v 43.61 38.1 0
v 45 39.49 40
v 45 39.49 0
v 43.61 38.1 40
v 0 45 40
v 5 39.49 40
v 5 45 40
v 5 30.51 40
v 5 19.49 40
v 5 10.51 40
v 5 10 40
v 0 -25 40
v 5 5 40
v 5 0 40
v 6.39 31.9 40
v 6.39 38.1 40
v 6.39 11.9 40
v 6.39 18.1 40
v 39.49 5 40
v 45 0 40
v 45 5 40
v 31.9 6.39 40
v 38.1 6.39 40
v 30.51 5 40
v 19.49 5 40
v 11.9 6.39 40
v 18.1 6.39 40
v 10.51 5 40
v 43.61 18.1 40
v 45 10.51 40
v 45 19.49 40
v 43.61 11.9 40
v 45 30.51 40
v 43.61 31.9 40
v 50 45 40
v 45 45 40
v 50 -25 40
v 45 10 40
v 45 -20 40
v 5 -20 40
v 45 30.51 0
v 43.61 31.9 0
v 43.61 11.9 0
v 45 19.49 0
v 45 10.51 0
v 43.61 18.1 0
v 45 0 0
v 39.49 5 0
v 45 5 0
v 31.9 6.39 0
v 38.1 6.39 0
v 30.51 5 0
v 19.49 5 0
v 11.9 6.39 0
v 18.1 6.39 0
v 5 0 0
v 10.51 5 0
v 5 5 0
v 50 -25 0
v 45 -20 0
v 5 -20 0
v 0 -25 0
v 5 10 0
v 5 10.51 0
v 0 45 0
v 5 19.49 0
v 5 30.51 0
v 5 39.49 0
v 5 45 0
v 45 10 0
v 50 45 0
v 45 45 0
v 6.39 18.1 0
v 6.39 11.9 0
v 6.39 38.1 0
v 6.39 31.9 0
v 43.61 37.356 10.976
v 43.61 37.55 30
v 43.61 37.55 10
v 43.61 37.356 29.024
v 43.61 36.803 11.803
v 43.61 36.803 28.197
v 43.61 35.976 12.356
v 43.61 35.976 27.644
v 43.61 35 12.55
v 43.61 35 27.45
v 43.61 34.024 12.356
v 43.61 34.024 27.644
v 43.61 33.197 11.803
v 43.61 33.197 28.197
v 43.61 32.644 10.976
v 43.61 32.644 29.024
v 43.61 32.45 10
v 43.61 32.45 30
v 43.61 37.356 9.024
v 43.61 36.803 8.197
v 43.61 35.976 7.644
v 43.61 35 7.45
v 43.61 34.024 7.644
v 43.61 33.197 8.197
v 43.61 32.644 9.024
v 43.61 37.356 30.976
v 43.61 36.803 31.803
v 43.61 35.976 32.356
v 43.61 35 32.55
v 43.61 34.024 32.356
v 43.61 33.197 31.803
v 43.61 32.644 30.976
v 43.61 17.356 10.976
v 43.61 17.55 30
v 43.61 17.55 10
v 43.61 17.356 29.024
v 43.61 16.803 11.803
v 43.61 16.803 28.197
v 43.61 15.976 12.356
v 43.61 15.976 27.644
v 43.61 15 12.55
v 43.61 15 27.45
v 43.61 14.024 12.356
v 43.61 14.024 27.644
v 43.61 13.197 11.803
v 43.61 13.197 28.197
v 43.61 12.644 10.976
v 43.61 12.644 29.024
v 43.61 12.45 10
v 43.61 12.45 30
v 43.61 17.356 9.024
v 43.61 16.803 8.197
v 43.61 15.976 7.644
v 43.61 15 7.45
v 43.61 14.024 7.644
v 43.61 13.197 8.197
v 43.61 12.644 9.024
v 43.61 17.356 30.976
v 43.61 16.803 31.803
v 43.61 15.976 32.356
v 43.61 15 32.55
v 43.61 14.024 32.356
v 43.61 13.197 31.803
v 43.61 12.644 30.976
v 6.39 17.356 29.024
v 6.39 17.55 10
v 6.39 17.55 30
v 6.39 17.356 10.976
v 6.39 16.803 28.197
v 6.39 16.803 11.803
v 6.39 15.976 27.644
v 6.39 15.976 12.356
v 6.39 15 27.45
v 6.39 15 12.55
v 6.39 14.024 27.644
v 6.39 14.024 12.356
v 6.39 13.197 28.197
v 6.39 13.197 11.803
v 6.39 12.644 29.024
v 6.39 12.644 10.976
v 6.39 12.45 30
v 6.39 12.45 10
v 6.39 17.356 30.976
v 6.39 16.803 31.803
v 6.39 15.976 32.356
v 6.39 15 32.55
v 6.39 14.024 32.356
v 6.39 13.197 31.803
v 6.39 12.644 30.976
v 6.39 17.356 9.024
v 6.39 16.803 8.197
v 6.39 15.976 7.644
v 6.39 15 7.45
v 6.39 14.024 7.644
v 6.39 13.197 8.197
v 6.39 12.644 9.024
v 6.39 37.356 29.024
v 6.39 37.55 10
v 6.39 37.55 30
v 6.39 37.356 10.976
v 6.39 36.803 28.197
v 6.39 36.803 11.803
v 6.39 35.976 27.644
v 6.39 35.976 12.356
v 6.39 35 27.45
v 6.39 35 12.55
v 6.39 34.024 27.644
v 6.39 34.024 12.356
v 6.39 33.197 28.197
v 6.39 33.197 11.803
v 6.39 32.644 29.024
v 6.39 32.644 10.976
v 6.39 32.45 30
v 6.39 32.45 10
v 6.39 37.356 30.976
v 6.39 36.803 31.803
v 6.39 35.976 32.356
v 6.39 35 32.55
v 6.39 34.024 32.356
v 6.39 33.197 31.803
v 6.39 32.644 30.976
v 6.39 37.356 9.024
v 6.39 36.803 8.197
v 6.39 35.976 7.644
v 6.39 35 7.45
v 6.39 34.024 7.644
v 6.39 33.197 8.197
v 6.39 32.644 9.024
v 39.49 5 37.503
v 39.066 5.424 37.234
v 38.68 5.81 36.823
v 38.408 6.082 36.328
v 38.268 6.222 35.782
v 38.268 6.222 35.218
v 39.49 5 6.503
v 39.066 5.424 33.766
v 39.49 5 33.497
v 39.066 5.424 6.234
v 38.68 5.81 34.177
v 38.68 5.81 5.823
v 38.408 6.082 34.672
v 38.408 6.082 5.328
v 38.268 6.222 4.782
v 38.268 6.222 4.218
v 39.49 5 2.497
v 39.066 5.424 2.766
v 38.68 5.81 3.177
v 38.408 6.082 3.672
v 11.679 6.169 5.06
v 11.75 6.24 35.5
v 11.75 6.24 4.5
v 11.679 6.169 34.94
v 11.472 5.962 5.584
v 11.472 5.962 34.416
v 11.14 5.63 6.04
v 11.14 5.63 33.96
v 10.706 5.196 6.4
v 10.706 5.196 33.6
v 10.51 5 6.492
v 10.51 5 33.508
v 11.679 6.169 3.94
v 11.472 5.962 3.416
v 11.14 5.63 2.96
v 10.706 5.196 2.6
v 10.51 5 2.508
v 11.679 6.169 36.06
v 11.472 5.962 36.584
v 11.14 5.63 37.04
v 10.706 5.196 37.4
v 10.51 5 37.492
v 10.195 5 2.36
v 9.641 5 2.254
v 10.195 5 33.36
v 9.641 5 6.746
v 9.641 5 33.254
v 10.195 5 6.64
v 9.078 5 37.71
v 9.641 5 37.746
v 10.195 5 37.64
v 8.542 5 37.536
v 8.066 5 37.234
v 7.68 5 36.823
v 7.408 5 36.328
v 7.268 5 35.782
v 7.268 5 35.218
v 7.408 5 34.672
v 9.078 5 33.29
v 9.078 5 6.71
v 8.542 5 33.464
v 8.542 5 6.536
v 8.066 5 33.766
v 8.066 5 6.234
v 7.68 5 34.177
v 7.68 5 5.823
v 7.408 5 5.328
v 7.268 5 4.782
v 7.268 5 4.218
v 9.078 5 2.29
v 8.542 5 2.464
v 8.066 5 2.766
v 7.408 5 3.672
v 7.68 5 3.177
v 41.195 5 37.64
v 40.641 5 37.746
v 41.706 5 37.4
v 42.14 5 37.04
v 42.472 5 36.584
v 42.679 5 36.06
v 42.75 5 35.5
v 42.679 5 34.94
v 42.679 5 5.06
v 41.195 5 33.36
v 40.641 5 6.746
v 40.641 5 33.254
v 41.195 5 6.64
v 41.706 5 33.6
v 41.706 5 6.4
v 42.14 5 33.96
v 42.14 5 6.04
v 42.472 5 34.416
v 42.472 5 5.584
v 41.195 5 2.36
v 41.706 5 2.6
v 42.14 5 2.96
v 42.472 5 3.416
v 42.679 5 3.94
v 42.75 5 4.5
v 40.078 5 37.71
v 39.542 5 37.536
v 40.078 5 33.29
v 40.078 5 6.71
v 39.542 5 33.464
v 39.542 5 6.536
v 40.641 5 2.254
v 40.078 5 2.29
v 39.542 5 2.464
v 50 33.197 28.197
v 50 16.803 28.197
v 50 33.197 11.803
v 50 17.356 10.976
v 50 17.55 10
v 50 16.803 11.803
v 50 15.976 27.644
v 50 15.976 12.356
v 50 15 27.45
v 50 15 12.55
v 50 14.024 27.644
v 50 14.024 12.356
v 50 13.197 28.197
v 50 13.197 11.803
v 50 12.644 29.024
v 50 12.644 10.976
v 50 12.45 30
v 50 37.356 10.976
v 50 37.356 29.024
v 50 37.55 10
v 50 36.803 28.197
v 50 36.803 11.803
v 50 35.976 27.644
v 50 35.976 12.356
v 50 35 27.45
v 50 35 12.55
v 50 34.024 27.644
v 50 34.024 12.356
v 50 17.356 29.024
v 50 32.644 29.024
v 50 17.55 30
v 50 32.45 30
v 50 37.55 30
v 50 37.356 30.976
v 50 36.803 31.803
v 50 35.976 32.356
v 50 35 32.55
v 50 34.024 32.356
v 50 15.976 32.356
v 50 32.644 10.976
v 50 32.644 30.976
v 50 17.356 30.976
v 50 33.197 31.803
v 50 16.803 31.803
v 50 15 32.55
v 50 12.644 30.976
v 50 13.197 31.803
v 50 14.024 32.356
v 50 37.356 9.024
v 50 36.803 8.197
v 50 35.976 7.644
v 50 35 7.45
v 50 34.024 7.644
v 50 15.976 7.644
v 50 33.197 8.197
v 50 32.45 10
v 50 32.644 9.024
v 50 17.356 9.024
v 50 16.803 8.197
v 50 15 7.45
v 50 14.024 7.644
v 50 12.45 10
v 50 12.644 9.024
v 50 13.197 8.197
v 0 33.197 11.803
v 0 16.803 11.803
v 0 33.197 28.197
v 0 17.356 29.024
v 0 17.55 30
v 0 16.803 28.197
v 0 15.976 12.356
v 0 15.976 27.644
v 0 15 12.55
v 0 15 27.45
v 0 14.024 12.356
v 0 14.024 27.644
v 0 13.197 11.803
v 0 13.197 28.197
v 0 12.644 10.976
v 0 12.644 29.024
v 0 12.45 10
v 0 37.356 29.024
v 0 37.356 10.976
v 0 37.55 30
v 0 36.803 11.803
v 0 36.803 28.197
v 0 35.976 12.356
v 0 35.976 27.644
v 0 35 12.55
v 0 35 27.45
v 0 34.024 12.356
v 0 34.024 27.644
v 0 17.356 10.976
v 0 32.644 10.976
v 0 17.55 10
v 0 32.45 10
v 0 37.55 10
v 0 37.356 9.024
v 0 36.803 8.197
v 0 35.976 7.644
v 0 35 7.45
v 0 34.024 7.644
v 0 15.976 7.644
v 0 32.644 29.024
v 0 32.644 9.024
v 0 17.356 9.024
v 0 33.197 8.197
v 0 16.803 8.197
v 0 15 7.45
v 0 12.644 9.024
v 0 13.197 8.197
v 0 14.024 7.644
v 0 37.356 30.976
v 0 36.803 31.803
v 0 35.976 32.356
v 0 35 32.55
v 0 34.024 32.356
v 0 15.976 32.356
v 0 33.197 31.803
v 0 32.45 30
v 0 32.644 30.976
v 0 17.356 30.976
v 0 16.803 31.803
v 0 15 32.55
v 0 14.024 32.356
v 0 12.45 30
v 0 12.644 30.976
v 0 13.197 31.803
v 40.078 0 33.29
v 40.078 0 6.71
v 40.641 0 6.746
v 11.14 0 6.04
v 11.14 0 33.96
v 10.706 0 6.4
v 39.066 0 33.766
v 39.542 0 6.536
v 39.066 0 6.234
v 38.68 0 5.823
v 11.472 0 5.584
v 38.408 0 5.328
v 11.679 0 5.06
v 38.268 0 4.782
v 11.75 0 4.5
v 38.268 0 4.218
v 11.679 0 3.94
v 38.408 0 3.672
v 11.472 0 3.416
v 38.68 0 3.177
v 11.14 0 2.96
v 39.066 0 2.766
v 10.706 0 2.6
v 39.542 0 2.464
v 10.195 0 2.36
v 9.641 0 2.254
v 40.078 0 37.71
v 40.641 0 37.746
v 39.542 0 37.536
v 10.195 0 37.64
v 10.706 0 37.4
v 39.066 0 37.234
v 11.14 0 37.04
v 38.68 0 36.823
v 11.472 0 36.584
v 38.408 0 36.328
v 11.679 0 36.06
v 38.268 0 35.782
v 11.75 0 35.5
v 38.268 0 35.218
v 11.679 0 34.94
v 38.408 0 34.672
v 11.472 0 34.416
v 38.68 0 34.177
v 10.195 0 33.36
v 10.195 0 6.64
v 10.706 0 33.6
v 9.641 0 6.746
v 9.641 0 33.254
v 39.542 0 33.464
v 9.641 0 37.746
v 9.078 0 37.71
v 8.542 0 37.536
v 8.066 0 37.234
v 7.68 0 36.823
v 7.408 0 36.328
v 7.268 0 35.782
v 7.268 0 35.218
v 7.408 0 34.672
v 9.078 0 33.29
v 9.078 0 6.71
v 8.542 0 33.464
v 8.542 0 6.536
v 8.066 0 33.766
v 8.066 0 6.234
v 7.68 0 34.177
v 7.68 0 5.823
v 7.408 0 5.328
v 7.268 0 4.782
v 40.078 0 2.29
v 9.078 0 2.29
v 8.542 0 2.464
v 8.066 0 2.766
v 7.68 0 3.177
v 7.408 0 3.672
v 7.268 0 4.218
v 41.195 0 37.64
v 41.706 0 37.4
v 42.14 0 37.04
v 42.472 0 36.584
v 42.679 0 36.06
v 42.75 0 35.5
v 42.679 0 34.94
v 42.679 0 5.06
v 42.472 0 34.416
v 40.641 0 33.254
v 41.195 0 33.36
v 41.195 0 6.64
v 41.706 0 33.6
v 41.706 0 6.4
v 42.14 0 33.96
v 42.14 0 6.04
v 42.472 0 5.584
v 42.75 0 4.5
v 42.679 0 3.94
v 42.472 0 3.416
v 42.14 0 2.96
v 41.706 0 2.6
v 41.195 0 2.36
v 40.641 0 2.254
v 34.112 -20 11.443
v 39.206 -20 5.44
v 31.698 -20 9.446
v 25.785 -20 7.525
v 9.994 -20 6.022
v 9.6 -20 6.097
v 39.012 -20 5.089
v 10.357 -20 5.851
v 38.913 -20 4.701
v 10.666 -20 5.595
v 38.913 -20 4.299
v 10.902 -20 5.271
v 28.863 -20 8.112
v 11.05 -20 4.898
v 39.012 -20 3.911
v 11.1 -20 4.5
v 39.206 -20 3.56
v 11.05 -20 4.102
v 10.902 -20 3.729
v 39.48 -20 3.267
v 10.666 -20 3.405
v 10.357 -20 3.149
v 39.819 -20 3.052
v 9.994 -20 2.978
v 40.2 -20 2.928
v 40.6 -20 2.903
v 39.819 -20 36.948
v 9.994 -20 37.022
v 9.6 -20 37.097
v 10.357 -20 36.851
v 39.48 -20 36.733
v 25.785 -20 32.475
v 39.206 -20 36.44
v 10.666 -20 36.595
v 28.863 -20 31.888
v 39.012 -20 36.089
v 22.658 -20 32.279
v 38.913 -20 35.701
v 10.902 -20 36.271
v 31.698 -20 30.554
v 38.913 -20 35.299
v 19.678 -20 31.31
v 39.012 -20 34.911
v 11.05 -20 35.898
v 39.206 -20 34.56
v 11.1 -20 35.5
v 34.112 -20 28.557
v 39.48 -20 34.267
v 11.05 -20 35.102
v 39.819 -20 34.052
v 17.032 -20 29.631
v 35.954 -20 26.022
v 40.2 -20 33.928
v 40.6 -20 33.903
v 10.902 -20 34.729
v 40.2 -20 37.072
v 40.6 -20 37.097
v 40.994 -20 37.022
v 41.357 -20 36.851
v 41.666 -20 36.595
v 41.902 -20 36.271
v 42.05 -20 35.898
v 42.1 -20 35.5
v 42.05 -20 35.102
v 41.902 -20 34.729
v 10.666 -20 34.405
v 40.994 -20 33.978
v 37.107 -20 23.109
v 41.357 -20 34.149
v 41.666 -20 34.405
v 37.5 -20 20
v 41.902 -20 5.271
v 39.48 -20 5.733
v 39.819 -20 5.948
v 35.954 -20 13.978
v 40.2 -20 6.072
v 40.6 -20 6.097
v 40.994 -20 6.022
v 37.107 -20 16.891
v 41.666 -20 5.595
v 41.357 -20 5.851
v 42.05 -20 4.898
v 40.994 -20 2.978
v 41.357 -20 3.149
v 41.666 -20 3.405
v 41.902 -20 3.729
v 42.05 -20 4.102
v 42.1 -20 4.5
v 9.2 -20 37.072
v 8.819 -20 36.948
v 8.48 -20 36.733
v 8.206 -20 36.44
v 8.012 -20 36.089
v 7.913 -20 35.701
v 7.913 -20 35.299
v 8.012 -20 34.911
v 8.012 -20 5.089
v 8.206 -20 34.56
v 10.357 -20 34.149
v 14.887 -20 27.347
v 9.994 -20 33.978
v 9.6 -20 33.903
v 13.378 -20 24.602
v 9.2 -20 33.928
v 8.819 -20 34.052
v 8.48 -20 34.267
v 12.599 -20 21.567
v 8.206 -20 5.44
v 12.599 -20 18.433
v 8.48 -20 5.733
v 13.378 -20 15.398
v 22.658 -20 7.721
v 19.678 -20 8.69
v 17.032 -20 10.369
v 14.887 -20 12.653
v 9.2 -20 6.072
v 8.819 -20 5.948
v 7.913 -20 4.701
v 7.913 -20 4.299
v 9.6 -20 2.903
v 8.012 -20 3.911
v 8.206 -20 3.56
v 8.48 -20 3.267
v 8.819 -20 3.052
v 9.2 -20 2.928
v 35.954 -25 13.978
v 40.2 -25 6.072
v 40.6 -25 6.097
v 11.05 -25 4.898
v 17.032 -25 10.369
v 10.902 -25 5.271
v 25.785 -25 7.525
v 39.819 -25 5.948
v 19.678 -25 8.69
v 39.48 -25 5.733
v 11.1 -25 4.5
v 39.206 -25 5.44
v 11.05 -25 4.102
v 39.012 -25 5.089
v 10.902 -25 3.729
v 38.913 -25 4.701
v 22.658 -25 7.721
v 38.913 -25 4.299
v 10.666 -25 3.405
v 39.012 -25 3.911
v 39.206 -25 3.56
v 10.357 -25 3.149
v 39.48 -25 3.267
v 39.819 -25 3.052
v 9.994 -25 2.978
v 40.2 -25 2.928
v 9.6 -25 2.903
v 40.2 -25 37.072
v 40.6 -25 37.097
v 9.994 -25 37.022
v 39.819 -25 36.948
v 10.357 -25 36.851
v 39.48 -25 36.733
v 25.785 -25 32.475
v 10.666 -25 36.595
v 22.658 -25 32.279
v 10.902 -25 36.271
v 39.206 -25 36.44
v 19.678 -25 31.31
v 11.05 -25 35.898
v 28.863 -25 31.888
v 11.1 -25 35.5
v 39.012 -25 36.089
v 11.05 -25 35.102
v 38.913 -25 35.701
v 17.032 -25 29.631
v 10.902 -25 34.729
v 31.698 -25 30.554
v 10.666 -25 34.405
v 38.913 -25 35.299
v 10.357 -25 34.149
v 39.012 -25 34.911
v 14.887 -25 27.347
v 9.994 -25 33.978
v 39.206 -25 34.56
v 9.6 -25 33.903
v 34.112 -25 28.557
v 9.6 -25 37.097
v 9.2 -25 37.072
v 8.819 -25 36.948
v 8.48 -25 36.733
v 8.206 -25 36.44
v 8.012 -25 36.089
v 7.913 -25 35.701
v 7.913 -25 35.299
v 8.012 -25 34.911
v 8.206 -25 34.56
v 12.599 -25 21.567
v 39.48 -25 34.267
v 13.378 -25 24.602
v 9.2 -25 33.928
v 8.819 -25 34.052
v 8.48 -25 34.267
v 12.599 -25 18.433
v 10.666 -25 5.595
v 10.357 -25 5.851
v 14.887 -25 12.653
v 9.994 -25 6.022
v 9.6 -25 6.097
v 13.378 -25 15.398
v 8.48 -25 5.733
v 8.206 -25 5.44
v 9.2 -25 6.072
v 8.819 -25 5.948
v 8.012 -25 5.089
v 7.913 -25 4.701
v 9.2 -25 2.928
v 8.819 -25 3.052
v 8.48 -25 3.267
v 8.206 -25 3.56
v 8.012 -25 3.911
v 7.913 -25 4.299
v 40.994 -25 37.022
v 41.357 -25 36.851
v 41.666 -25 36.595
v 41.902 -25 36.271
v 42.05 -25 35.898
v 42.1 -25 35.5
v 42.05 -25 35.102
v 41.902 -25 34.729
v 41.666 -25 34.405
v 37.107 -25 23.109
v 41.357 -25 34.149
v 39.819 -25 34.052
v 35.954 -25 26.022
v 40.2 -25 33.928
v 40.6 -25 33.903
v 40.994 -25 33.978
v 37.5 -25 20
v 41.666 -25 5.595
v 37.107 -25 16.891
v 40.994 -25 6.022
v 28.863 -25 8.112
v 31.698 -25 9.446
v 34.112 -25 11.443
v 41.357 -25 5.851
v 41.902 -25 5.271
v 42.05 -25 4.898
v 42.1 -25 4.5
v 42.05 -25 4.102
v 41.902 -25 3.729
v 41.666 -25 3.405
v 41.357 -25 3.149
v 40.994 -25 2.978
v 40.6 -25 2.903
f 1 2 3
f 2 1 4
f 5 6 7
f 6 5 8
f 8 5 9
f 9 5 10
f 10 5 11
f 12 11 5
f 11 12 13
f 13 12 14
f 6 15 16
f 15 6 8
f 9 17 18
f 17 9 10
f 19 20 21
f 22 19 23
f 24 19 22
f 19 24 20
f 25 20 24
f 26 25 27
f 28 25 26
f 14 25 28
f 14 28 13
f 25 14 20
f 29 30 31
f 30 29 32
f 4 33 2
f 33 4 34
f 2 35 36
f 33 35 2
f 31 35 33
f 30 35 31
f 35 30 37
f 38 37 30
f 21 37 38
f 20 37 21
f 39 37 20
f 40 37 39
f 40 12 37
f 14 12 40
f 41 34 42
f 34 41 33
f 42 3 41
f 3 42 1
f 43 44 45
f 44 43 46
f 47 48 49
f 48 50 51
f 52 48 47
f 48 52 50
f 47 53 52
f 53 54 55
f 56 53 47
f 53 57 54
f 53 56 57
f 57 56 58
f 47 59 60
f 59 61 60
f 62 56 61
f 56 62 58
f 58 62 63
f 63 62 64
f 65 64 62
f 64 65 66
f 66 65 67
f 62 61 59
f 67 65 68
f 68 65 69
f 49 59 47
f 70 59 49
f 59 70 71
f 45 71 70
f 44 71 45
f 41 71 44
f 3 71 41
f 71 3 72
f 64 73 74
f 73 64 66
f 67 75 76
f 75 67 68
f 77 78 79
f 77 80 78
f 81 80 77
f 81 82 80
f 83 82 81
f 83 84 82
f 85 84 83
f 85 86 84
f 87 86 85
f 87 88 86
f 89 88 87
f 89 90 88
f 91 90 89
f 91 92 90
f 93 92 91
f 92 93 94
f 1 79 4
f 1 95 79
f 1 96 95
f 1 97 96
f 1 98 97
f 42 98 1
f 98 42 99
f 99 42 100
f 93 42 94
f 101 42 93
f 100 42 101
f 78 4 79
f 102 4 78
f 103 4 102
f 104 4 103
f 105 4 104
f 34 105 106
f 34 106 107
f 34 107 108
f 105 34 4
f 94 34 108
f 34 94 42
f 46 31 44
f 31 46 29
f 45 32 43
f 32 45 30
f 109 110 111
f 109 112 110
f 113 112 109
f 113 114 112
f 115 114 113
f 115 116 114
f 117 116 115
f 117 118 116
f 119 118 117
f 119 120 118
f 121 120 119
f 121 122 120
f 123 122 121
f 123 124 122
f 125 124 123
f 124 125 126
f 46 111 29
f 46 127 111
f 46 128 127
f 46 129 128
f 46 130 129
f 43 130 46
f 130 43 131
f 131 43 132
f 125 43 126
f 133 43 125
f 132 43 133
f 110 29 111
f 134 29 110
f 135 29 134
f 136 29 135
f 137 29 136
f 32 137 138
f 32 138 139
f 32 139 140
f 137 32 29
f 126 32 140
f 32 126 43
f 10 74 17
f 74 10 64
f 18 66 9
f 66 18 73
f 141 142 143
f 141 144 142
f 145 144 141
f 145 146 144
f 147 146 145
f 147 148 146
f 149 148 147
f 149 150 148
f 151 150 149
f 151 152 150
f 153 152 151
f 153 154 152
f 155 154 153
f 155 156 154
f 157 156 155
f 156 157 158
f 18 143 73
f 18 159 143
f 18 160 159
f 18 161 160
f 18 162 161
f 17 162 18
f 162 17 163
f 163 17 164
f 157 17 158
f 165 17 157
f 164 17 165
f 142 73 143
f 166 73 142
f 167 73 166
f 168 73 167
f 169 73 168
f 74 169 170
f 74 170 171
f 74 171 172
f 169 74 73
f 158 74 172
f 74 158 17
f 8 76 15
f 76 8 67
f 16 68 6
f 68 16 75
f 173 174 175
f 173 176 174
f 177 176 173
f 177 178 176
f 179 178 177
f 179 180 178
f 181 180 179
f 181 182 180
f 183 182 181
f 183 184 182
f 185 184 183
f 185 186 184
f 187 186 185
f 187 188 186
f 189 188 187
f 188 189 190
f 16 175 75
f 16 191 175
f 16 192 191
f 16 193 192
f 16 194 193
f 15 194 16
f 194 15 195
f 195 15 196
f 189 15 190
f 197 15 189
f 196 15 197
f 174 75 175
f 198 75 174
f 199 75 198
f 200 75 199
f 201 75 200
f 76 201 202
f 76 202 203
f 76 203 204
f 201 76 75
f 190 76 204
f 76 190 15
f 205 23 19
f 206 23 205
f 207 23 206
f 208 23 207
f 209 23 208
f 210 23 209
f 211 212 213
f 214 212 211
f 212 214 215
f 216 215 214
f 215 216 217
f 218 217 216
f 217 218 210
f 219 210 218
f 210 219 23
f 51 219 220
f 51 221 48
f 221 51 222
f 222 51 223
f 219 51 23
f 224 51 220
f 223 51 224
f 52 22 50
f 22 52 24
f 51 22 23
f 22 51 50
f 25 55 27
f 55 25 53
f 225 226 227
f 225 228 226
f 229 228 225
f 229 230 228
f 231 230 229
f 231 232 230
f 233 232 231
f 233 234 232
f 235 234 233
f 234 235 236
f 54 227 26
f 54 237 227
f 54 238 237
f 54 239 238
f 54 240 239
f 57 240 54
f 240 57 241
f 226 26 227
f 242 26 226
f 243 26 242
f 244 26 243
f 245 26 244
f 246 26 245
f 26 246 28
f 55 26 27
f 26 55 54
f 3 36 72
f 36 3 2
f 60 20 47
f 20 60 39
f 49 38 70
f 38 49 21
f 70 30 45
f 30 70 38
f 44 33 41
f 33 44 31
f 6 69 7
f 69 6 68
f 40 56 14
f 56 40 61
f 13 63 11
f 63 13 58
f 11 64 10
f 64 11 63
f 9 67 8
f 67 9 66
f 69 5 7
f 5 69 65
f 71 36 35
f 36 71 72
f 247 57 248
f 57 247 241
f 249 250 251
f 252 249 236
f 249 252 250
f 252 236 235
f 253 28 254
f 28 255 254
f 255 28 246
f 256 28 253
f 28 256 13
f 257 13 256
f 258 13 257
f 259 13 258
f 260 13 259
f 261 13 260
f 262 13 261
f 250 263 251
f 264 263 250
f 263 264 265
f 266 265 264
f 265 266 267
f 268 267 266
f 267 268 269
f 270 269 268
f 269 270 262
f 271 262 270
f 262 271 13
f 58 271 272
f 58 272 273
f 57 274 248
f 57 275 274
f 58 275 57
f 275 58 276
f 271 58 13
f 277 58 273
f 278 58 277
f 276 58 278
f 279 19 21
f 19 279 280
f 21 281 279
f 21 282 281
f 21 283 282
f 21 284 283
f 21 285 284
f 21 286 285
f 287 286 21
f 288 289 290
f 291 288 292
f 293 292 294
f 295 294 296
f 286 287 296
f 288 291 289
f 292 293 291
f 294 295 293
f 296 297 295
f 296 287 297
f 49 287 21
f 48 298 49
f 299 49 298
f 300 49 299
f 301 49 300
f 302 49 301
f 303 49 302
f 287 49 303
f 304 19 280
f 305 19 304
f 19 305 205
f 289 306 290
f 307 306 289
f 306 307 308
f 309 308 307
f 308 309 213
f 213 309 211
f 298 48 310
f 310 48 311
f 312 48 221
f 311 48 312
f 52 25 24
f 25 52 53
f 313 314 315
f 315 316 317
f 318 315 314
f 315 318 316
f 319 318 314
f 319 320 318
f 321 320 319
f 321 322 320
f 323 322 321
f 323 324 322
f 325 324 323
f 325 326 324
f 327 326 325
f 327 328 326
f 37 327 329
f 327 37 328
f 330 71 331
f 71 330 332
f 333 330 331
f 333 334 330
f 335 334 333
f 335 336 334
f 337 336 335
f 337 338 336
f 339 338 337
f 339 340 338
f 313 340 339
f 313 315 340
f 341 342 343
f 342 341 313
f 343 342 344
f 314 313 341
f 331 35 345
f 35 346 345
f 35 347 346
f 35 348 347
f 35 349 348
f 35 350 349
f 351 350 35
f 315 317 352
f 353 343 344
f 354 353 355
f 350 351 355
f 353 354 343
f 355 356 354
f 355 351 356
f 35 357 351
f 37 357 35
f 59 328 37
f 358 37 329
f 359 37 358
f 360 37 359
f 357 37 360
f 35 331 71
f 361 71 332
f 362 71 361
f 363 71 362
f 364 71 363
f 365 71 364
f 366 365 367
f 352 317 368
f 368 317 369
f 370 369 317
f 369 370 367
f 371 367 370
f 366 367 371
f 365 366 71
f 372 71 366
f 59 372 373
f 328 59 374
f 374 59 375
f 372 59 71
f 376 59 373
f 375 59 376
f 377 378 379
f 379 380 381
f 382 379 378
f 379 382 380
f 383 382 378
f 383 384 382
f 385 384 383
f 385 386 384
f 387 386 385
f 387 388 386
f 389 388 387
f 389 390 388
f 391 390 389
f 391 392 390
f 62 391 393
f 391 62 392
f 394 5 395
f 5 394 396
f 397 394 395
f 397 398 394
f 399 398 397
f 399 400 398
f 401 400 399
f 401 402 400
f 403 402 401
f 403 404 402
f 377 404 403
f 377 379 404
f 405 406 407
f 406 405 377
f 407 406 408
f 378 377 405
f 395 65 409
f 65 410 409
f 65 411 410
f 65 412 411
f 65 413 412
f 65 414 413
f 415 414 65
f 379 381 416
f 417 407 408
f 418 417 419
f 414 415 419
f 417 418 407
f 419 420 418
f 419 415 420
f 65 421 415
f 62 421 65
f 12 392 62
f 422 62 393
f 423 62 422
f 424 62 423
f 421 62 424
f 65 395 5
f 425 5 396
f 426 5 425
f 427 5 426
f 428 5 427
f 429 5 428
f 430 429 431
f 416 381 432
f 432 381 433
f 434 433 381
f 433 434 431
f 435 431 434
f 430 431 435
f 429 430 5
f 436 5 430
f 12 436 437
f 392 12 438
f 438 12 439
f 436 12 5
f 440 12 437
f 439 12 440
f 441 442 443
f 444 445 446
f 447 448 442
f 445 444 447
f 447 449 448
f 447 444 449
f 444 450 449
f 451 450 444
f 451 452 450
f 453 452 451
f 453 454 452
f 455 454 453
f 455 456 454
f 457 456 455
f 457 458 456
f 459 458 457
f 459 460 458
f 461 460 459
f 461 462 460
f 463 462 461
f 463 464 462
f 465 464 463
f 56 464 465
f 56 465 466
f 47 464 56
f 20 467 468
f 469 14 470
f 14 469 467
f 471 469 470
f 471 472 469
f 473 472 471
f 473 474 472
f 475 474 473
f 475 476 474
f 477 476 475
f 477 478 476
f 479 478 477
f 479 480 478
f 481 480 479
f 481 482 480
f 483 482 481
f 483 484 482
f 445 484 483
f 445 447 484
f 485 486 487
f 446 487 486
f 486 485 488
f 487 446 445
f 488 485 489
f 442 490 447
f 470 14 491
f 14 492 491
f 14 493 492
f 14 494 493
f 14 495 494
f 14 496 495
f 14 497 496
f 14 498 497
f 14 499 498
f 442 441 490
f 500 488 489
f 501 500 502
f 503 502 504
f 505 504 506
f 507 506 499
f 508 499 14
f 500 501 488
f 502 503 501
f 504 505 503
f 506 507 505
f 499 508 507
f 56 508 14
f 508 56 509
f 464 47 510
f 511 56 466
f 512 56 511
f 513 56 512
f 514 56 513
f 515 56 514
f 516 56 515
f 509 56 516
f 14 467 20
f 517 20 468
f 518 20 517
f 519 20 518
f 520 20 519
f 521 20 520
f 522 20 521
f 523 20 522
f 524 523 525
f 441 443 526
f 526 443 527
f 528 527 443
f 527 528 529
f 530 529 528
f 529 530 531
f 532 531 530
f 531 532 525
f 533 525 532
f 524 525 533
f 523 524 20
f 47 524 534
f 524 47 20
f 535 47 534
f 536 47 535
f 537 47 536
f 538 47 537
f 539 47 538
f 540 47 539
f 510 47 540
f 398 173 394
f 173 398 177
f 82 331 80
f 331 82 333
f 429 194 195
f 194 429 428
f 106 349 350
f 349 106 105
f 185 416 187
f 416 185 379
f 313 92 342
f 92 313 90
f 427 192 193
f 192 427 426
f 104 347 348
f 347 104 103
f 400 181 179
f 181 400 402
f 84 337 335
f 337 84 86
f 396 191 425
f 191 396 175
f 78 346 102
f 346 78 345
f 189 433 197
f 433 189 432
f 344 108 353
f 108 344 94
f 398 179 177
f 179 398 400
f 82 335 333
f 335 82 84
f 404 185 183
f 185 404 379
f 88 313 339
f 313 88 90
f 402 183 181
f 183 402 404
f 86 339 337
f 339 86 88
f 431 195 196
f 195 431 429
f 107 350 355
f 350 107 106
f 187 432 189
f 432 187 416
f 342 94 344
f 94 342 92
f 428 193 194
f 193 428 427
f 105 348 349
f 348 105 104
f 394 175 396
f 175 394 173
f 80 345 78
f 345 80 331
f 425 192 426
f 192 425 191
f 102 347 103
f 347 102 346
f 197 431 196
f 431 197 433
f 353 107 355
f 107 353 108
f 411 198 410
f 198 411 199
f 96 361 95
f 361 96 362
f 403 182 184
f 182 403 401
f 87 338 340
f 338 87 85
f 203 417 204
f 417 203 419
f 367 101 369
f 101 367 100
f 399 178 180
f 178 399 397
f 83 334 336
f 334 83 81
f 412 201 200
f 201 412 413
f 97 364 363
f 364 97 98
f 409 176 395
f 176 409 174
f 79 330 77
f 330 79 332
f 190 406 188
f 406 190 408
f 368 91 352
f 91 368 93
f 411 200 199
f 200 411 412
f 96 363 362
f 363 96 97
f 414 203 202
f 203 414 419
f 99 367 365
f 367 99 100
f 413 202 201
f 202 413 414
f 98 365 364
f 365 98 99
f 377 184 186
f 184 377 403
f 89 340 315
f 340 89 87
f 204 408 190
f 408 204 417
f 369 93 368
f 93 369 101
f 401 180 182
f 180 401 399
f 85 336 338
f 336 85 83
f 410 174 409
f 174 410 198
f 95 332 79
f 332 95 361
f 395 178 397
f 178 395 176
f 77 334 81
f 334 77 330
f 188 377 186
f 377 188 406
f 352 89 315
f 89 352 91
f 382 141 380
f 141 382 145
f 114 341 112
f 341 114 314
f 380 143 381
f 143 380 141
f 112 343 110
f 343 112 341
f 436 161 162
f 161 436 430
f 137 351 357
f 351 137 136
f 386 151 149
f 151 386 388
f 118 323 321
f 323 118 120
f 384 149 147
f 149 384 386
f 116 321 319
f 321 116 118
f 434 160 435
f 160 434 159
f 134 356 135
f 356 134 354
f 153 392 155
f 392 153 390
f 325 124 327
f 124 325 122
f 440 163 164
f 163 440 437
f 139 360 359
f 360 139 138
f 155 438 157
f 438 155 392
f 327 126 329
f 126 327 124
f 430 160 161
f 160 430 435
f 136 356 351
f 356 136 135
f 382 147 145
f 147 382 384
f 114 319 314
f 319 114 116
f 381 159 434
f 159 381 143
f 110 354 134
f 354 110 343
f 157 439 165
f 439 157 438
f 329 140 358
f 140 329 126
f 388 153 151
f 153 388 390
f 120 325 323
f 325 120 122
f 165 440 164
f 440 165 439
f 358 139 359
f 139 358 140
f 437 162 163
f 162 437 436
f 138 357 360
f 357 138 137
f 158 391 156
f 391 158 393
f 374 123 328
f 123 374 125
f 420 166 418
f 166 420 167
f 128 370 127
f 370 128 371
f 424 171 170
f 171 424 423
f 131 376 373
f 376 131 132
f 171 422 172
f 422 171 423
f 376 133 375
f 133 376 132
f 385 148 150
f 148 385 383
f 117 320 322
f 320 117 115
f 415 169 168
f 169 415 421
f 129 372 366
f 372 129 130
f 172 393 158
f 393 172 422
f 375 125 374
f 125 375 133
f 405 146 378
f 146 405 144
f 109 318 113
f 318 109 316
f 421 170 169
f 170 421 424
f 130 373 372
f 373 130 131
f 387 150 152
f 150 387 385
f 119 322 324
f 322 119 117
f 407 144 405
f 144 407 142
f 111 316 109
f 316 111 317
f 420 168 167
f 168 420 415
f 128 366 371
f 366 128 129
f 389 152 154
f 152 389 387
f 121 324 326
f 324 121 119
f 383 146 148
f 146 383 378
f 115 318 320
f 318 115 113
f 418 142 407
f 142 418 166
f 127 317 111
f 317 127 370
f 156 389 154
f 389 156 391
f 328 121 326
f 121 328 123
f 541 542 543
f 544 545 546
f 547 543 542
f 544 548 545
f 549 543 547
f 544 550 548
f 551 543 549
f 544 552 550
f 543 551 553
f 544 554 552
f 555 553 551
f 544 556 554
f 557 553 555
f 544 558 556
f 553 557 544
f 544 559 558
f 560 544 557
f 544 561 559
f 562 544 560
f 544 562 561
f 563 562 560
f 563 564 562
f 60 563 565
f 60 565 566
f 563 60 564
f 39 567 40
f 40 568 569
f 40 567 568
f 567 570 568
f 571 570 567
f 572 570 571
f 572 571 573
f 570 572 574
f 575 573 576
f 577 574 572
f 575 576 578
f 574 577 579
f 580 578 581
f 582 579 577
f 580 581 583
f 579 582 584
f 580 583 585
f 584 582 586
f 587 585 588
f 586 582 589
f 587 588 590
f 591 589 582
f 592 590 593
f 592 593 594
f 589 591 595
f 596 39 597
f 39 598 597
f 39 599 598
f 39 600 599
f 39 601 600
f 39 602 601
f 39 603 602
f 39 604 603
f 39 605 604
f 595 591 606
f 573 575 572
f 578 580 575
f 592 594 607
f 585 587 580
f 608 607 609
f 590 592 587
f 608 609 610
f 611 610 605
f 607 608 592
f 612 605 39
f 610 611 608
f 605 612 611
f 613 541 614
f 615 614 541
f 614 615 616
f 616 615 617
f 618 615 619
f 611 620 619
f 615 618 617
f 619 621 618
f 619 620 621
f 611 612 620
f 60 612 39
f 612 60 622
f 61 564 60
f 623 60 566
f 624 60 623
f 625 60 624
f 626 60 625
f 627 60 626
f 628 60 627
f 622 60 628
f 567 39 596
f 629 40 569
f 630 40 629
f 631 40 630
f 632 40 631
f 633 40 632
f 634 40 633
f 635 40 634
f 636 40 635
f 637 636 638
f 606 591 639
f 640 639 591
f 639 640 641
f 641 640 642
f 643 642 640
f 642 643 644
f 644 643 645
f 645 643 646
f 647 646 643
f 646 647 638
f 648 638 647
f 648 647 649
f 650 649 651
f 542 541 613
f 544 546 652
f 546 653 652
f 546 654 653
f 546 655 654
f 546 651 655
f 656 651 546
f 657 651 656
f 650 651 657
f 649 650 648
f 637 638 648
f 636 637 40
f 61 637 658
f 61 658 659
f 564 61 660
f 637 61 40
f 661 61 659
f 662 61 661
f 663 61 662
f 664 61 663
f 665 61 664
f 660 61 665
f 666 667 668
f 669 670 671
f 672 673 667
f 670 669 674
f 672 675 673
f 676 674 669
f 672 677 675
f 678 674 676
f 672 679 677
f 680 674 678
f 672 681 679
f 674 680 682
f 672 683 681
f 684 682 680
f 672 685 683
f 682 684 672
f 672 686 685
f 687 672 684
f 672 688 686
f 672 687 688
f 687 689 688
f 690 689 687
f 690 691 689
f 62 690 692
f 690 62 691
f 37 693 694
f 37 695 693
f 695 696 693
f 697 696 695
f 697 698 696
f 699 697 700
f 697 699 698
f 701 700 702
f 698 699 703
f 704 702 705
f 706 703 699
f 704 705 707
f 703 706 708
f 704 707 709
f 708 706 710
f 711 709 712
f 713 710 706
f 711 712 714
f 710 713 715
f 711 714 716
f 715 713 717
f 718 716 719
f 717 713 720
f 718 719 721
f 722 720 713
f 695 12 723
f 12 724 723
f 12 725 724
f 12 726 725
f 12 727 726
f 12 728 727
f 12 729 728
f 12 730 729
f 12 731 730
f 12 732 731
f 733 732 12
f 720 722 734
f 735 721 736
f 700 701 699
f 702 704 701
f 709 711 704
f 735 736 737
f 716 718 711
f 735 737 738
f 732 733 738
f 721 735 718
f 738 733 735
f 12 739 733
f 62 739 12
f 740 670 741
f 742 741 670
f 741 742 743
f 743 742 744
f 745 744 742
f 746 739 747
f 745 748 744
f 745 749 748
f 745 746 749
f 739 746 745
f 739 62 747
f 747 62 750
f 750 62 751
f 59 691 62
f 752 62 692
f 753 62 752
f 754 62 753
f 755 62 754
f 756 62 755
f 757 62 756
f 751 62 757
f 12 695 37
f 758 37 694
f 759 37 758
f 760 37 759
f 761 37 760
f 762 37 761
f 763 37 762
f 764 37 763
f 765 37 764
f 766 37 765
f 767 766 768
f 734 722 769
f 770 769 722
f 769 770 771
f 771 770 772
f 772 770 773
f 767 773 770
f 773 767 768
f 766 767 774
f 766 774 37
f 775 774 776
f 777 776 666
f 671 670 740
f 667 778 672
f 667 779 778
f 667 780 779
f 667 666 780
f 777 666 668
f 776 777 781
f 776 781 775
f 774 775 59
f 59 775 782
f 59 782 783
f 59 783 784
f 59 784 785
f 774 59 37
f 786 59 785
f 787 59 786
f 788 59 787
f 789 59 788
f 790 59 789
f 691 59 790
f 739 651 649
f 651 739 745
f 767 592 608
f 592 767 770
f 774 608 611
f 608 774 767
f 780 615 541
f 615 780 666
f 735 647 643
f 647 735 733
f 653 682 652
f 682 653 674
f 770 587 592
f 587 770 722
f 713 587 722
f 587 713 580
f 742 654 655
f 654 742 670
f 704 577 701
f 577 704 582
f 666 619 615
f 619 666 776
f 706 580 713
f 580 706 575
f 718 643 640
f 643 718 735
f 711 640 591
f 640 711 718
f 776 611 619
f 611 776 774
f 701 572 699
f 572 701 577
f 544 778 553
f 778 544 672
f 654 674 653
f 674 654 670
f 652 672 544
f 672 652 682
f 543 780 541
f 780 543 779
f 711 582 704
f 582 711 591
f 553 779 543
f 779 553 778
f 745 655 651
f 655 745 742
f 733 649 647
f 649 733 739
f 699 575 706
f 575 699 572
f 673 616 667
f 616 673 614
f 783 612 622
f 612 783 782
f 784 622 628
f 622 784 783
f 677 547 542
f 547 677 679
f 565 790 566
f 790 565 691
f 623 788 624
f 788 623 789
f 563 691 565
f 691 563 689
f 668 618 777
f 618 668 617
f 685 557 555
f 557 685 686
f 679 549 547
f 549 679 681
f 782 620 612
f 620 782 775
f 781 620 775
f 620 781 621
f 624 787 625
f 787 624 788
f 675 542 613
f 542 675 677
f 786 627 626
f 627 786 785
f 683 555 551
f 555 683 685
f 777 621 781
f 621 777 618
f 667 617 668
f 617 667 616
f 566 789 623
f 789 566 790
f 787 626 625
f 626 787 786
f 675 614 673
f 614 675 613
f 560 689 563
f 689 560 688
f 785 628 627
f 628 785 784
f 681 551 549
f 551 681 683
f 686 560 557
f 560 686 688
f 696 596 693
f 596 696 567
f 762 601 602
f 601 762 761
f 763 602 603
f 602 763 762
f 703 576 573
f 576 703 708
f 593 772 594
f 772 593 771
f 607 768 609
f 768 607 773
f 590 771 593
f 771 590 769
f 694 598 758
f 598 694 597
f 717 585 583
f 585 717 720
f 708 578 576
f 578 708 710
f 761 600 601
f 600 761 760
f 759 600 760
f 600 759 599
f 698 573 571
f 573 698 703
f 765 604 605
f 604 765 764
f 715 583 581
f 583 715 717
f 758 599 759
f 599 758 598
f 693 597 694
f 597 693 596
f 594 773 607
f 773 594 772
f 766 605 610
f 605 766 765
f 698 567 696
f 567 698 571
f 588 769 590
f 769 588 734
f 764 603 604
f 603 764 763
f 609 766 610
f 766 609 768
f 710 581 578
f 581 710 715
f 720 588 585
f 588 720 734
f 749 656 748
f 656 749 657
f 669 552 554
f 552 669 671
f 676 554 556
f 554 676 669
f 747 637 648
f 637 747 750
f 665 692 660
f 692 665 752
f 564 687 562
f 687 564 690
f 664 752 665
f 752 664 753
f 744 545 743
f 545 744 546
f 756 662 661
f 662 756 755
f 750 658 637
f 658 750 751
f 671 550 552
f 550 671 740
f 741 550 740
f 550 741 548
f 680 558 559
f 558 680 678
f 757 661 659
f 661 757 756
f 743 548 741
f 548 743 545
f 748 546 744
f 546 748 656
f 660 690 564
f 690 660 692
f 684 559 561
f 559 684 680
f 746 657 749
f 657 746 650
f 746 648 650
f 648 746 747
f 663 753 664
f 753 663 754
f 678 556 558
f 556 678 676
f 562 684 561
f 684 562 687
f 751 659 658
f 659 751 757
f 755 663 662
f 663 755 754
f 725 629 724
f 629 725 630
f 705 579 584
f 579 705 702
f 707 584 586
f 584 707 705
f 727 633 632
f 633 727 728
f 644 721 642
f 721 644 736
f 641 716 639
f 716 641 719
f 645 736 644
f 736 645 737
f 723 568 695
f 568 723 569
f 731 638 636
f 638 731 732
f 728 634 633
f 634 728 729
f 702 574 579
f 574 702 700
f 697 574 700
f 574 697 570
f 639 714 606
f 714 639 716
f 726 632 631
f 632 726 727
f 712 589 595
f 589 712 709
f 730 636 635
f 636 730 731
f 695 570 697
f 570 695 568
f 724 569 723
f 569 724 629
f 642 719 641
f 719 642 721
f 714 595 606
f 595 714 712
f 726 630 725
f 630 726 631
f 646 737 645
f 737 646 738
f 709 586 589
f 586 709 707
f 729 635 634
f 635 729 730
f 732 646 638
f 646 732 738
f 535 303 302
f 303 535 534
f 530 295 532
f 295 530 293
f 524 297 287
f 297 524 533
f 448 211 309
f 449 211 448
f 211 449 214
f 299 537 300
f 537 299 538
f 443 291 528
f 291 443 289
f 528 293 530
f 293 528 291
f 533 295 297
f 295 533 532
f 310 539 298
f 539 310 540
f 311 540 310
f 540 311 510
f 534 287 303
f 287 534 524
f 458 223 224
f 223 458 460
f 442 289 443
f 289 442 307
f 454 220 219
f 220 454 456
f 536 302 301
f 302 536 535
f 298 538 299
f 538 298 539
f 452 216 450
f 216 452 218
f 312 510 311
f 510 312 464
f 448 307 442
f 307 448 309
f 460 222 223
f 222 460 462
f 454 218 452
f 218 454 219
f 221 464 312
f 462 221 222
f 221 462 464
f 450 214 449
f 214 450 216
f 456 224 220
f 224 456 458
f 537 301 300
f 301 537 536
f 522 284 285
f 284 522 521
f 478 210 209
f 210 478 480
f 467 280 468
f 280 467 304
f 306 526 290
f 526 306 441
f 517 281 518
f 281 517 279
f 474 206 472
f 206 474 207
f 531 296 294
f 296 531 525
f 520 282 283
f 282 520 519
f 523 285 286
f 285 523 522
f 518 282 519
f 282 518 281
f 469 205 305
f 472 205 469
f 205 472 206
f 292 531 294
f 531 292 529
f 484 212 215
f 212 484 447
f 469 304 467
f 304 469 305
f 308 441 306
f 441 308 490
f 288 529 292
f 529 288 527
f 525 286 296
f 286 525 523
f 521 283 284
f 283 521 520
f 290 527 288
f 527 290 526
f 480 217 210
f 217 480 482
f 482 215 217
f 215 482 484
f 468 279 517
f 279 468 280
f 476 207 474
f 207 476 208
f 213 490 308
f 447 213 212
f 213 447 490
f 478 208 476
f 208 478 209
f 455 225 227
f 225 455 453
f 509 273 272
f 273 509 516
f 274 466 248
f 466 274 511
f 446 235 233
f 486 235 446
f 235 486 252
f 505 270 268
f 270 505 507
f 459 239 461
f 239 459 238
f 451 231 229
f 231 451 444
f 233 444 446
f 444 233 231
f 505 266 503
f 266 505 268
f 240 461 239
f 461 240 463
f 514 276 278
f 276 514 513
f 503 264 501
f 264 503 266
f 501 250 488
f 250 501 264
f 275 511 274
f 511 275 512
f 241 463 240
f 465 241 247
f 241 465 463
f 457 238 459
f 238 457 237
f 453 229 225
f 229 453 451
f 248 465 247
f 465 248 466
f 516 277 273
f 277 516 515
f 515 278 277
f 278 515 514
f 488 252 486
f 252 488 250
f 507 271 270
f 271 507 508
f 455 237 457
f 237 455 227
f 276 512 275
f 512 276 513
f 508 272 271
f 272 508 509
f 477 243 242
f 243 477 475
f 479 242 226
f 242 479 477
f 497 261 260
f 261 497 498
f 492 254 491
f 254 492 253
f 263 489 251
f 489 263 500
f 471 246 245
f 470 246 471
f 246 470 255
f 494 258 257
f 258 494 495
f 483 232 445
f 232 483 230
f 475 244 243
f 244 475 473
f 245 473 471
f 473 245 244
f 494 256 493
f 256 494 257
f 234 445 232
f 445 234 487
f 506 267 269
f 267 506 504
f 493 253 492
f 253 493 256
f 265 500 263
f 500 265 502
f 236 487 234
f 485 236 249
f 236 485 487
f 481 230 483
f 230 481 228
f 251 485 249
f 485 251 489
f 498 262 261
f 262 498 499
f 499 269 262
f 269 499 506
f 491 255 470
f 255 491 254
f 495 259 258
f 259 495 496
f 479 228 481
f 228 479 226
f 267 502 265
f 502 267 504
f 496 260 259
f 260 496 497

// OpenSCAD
thickness = 10;
height = 40;
extrusion_x = 40;
extrusion_y = 40;
center_x = thickness / 2 + 20;
center_z = height / 2;

motor_mount();

module motor_mount(){
    difference(){
        union(){
            base();
            translate([0,-25 - (thickness / 2) + thickness / 2,0]) mount();            
        }  
  
        //Cutout to only wrap around half the extrusion
        translate([0, thickness / 2 + extrusion_y, 0]) cube([extrusion_x + thickness, extrusion_y, height]);
        
        //Holes for hex wrench to install stepper
        translate([center_x + 15.5,thickness,center_z - 15.5]) rotate([90,0,0]) cylinder(d=4.5, $fn=25, h=thickness + 5);
        translate([center_x + 15.5,thickness,center_z + 15.5]) rotate([90,0,0]) cylinder(d=4.5, $fn=25, h=thickness + 5);
        translate([center_x - 15.5,thickness,center_z - 15.5]) rotate([90,0,0]) cylinder(d=4.5, $fn=25, h=thickness + 5);
        translate([center_x - 15.5,thickness,center_z + 15.5]) rotate([90,0,0]) cylinder(d=4.5, $fn=25, h=thickness + 5);
    }
}

module mount(){
    difference(){
        linear_extrude(height=height){
            difference(){
                square([40 + thickness / 2 * 2, 30 + thickness / 2]);
                translate([thickness / 2,thickness / 2,0]) square([40, 30 + thickness]);
            }        
        }
        //Axle hole
        translate([(40 + thickness ) / 2, thickness / 2 + 2.5, 20]) rotate([90,0,0]) cylinder(d=25, $fn=25, h=thickness / 2 + 5);
        //Stepper holes
        translate([center_x + 15.5,thickness / 2,center_z - 15.5]) rotate([90,0,0]) cylinder(d=3.2, $fn=25, h=thickness / 2 + 5);
        translate([center_x + 15.5,thickness / 2,center_z + 15.5]) rotate([90,0,0]) cylinder(d=3.2, $fn=25, h=thickness / 2 + 5);
        translate([center_x - 15.5,thickness / 2,center_z - 15.5]) rotate([90,0,0]) cylinder(d=3.2, $fn=25, h=thickness / 2 + 5);
        translate([center_x - 15.5,thickness / 2,center_z + 15.5]) rotate([90,0,0]) cylinder(d=3.2, $fn=25, h=thickness / 2 + 5);
    }

}

module base(){
    translate([(thickness + extrusion_x) / 2, (extrusion_y / 2) + (thickness /2 ),height / 2]){
        difference(){
           cube([extrusion_x + thickness, extrusion_y + thickness, height], center=true);
           
            vslot_extrusion(extrusion_x,extrusion_y,height);
            
           translate([0, extrusion_y / 4, extrusion_y / 4]) rotate([0,90,0])  cylinder(d=5.1, h=thickness * 2 + 40, $fn=16, center=true);
           translate([0, extrusion_y / 4, -extrusion_y / 4]) rotate([0,90,0])  cylinder(d=5.1, h=thickness * 2 + 40, $fn=16, center=true);  
           translate([0, -extrusion_y / 4, extrusion_y / 4]) rotate([0,90,0])  cylinder(d=5.1, h=thickness * 2 + 40, $fn=16, center=true); 
           translate([0, -extrusion_y / 4, -extrusion_y / 4]) rotate([0,90,0])  cylinder(d=5.1, h=thickness * 2 + 40, $fn=16, center=true); 

        }         
    }
   
}



module vslot_extrusion(x,y,length = 20) {
    difference(){
        cube([x,y,length],center=true);
        translate([x / 2 + 0.01,y / 4,0]) vslot();
        translate([x / 2 + 0.01,-y  / 4,0]) vslot();
        translate([-x / 2 - 0.01,-y / 4,0]) rotate([0,0,180]) vslot();
        translate([-x / 2 - 0.01,y / 4,0]) rotate([0,0,180]) vslot();
        //translate([x / 4,y / 2 + 0.01,0]) rotate([0,0,90]) vslot();
        //translate([-x / 4,y / 2 + 0.01,0]) rotate([0,0,90]) vslot();
        translate([x / 4,-y / 2 - 0.01,0]) rotate([0,0,-90]) vslot();
        translate([-x / 4,-y / 2 - 0.01,0]) rotate([0,0,-90]) vslot();
    }
    
    module vslot(){
        difference() {
            translate([0, 0, 0]) rotate([0, 0, 0])
             cylinder(r=4.5, h=length, center=true,  $fn=4);	

    //plane sides
            translate([-3.4, 0, 0]) rotate([0, 0, 0])
             cube([4, 20, length*2], center=true);
            translate([3, 0, 0]) rotate([0, 0, 0])
             cube([6, 20, length*2], center=true);
        }        
    }
}    
